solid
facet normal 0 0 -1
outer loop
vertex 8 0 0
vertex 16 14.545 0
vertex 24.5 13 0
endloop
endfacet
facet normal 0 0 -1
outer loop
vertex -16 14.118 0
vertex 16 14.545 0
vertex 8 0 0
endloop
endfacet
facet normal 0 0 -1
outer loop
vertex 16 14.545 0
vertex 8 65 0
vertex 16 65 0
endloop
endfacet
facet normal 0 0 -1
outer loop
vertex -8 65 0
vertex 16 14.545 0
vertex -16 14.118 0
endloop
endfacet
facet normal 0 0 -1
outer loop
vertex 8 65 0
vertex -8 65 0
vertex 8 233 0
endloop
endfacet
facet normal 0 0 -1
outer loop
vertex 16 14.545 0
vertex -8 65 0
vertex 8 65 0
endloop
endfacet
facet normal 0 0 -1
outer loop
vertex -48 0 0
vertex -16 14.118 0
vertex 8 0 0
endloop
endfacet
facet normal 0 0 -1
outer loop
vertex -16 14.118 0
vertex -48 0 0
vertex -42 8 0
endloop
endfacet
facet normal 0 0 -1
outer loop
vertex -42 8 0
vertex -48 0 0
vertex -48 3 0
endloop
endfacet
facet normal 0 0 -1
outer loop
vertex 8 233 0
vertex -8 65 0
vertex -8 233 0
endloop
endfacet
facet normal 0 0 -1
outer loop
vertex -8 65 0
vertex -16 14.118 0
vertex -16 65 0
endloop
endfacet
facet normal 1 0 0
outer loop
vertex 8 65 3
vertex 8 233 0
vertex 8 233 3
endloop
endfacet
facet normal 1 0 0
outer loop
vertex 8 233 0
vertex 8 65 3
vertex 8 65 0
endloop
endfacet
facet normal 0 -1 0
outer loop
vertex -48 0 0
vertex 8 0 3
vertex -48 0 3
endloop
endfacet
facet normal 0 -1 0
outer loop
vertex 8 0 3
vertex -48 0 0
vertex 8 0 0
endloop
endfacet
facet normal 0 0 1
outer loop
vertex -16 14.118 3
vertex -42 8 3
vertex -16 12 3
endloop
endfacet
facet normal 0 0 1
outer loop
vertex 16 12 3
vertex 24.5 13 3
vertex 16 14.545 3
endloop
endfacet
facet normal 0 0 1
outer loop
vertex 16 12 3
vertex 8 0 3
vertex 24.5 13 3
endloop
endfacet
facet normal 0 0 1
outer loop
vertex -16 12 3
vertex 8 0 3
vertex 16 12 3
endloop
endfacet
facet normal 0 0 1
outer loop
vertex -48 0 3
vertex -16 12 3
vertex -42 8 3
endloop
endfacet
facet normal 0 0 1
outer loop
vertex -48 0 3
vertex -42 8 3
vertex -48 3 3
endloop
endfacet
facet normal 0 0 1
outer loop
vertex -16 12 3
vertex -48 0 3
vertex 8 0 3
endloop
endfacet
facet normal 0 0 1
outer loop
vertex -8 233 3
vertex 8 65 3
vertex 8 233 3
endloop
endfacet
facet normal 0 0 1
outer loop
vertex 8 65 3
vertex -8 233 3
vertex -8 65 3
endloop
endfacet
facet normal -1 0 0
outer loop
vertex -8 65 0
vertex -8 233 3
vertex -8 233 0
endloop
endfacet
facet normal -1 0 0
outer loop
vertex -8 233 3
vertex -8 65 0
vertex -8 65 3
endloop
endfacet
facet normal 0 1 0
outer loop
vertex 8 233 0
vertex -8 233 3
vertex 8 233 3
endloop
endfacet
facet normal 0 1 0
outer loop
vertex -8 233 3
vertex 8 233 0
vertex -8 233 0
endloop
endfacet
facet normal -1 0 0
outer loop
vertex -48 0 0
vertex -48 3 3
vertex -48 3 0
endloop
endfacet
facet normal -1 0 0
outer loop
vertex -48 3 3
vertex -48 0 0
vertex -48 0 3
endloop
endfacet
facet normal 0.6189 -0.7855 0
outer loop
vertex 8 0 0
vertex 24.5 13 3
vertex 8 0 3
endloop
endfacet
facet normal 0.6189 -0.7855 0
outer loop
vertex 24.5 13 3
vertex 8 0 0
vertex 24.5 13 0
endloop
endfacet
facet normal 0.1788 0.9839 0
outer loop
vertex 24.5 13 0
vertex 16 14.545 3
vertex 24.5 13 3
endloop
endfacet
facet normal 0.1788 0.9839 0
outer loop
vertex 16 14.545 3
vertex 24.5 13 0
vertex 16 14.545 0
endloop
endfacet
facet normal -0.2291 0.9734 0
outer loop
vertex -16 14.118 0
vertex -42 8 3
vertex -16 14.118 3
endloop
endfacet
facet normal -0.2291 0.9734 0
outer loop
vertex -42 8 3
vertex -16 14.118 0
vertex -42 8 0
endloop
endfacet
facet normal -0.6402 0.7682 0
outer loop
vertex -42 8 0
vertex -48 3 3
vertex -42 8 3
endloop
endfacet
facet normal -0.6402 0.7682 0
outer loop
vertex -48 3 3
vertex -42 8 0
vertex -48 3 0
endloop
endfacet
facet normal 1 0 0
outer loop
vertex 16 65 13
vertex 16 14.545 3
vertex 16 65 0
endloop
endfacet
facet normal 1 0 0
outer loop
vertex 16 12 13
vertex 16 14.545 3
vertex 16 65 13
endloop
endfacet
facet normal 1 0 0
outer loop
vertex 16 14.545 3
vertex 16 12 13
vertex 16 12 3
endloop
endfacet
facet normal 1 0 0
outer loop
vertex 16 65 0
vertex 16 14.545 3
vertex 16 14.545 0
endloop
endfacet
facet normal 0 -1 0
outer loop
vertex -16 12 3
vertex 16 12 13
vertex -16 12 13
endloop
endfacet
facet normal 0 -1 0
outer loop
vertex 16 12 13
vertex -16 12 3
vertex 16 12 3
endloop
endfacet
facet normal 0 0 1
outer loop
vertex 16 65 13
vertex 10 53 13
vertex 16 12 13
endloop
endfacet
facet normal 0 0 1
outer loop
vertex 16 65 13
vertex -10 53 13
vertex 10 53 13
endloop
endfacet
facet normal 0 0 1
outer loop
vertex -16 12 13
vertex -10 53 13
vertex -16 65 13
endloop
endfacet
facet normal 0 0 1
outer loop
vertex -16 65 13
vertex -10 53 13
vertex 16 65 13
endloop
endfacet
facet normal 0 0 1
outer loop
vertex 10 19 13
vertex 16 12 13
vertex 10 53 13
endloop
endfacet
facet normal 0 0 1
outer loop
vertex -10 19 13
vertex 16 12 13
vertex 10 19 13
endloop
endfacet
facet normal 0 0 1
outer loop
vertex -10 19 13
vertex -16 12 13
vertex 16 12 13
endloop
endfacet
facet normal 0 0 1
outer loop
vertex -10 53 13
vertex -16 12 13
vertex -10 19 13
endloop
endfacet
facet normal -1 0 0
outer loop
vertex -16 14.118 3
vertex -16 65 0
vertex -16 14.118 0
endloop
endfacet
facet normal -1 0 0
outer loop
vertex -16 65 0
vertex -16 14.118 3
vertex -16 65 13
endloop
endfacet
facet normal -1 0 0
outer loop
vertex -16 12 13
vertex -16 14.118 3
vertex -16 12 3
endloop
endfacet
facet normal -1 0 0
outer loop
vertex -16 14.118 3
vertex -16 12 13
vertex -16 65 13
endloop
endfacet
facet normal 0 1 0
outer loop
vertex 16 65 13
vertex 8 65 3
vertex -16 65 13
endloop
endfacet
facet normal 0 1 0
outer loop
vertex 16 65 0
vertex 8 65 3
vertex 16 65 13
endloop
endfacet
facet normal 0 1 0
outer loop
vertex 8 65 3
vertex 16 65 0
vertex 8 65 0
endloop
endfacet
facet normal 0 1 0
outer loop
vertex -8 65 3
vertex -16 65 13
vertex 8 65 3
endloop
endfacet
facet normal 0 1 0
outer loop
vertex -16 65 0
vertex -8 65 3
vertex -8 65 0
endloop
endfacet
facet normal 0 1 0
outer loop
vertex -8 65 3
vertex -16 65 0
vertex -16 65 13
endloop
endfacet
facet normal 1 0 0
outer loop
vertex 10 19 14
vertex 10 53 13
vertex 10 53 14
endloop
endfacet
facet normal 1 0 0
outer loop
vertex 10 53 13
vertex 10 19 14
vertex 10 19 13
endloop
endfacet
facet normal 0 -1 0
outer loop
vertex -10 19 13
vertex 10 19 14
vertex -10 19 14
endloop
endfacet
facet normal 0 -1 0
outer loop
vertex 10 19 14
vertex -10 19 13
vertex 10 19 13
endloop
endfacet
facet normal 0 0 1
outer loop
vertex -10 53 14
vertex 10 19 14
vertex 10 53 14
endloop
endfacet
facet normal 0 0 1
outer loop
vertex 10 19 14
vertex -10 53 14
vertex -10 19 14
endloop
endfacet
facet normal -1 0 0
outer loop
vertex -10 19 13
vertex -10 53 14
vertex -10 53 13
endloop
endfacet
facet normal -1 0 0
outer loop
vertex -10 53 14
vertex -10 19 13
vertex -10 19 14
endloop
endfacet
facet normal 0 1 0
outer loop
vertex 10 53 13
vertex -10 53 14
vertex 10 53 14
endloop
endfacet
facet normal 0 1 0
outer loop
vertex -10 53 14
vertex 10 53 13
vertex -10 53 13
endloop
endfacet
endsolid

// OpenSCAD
// Mitutoyo 500-196-30 digital caliper, 150 mm
// Closed caliper. Overall length, beam width and outside jaw length follow the Mitutoyo dimensional drawing. Slider, jaws and display are simplified for identification.
// Units: mm
$fn = 64;
union() {
    translate([0, 0, 0]) rotate([0, 0, 0])
        linear_extrude(height=3) polygon(points=[[-8.0, 0], [8.0, 0], [8.0, 233], [-8.0, 233]]);
    translate([0, 0, 0]) rotate([0, 0, 0])
        linear_extrude(height=3) polygon(points=[[-48.0, 0], [8.0, 0], [24.5, 13], [8.0, 8], [-8.0, 8], [-48.0, 3]]);
    translate([0, 0, 0]) rotate([0, 0, 0])
        linear_extrude(height=3) polygon(points=[[-48.0, 3], [-8.0, 6], [8.0, 6], [24.5, 13], [8.0, 16], [-8.0, 16], [-42.0, 8]]);
    translate([0, 0, 0]) rotate([0, 0, 0])
        linear_extrude(height=13) polygon(points=[[-16, 12], [16, 12], [16, 65], [-16, 65]]);
    translate([0, 0, 13]) rotate([0, 0, 0])
        linear_extrude(height=1) polygon(points=[[-10, 19], [10, 19], [10, 53], [-10, 53]]);
}
